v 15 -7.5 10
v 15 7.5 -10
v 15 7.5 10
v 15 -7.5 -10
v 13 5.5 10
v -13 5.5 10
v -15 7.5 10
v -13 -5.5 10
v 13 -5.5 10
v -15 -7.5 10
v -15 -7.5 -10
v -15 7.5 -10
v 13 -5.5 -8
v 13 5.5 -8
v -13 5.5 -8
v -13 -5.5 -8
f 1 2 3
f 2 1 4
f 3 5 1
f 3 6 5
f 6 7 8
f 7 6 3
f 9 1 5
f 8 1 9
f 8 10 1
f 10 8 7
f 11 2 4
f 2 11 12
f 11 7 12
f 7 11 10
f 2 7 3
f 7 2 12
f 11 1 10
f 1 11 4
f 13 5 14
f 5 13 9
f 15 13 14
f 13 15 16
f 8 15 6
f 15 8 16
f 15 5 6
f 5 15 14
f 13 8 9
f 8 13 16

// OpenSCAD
// Parametric Box
// Parameters can be overridden with -D on the command line:
//   openscad -D width=50 -D height=30 -D depth=20 -o box.stl box.scad

width  = 30;   // mm
height = 20;   // mm
depth  = 15;   // mm
wall   = 2;    // wall thickness

module parametric_box(w, h, d, t) {
    difference() {
        // Outer shell
        cube([w, d, h], center=true);
        // Inner cavity (open top)
        translate([0, 0, t])
            cube([w - 2*t, d - 2*t, h], center=true);
    }
}

parametric_box(width, height, depth, wall);
